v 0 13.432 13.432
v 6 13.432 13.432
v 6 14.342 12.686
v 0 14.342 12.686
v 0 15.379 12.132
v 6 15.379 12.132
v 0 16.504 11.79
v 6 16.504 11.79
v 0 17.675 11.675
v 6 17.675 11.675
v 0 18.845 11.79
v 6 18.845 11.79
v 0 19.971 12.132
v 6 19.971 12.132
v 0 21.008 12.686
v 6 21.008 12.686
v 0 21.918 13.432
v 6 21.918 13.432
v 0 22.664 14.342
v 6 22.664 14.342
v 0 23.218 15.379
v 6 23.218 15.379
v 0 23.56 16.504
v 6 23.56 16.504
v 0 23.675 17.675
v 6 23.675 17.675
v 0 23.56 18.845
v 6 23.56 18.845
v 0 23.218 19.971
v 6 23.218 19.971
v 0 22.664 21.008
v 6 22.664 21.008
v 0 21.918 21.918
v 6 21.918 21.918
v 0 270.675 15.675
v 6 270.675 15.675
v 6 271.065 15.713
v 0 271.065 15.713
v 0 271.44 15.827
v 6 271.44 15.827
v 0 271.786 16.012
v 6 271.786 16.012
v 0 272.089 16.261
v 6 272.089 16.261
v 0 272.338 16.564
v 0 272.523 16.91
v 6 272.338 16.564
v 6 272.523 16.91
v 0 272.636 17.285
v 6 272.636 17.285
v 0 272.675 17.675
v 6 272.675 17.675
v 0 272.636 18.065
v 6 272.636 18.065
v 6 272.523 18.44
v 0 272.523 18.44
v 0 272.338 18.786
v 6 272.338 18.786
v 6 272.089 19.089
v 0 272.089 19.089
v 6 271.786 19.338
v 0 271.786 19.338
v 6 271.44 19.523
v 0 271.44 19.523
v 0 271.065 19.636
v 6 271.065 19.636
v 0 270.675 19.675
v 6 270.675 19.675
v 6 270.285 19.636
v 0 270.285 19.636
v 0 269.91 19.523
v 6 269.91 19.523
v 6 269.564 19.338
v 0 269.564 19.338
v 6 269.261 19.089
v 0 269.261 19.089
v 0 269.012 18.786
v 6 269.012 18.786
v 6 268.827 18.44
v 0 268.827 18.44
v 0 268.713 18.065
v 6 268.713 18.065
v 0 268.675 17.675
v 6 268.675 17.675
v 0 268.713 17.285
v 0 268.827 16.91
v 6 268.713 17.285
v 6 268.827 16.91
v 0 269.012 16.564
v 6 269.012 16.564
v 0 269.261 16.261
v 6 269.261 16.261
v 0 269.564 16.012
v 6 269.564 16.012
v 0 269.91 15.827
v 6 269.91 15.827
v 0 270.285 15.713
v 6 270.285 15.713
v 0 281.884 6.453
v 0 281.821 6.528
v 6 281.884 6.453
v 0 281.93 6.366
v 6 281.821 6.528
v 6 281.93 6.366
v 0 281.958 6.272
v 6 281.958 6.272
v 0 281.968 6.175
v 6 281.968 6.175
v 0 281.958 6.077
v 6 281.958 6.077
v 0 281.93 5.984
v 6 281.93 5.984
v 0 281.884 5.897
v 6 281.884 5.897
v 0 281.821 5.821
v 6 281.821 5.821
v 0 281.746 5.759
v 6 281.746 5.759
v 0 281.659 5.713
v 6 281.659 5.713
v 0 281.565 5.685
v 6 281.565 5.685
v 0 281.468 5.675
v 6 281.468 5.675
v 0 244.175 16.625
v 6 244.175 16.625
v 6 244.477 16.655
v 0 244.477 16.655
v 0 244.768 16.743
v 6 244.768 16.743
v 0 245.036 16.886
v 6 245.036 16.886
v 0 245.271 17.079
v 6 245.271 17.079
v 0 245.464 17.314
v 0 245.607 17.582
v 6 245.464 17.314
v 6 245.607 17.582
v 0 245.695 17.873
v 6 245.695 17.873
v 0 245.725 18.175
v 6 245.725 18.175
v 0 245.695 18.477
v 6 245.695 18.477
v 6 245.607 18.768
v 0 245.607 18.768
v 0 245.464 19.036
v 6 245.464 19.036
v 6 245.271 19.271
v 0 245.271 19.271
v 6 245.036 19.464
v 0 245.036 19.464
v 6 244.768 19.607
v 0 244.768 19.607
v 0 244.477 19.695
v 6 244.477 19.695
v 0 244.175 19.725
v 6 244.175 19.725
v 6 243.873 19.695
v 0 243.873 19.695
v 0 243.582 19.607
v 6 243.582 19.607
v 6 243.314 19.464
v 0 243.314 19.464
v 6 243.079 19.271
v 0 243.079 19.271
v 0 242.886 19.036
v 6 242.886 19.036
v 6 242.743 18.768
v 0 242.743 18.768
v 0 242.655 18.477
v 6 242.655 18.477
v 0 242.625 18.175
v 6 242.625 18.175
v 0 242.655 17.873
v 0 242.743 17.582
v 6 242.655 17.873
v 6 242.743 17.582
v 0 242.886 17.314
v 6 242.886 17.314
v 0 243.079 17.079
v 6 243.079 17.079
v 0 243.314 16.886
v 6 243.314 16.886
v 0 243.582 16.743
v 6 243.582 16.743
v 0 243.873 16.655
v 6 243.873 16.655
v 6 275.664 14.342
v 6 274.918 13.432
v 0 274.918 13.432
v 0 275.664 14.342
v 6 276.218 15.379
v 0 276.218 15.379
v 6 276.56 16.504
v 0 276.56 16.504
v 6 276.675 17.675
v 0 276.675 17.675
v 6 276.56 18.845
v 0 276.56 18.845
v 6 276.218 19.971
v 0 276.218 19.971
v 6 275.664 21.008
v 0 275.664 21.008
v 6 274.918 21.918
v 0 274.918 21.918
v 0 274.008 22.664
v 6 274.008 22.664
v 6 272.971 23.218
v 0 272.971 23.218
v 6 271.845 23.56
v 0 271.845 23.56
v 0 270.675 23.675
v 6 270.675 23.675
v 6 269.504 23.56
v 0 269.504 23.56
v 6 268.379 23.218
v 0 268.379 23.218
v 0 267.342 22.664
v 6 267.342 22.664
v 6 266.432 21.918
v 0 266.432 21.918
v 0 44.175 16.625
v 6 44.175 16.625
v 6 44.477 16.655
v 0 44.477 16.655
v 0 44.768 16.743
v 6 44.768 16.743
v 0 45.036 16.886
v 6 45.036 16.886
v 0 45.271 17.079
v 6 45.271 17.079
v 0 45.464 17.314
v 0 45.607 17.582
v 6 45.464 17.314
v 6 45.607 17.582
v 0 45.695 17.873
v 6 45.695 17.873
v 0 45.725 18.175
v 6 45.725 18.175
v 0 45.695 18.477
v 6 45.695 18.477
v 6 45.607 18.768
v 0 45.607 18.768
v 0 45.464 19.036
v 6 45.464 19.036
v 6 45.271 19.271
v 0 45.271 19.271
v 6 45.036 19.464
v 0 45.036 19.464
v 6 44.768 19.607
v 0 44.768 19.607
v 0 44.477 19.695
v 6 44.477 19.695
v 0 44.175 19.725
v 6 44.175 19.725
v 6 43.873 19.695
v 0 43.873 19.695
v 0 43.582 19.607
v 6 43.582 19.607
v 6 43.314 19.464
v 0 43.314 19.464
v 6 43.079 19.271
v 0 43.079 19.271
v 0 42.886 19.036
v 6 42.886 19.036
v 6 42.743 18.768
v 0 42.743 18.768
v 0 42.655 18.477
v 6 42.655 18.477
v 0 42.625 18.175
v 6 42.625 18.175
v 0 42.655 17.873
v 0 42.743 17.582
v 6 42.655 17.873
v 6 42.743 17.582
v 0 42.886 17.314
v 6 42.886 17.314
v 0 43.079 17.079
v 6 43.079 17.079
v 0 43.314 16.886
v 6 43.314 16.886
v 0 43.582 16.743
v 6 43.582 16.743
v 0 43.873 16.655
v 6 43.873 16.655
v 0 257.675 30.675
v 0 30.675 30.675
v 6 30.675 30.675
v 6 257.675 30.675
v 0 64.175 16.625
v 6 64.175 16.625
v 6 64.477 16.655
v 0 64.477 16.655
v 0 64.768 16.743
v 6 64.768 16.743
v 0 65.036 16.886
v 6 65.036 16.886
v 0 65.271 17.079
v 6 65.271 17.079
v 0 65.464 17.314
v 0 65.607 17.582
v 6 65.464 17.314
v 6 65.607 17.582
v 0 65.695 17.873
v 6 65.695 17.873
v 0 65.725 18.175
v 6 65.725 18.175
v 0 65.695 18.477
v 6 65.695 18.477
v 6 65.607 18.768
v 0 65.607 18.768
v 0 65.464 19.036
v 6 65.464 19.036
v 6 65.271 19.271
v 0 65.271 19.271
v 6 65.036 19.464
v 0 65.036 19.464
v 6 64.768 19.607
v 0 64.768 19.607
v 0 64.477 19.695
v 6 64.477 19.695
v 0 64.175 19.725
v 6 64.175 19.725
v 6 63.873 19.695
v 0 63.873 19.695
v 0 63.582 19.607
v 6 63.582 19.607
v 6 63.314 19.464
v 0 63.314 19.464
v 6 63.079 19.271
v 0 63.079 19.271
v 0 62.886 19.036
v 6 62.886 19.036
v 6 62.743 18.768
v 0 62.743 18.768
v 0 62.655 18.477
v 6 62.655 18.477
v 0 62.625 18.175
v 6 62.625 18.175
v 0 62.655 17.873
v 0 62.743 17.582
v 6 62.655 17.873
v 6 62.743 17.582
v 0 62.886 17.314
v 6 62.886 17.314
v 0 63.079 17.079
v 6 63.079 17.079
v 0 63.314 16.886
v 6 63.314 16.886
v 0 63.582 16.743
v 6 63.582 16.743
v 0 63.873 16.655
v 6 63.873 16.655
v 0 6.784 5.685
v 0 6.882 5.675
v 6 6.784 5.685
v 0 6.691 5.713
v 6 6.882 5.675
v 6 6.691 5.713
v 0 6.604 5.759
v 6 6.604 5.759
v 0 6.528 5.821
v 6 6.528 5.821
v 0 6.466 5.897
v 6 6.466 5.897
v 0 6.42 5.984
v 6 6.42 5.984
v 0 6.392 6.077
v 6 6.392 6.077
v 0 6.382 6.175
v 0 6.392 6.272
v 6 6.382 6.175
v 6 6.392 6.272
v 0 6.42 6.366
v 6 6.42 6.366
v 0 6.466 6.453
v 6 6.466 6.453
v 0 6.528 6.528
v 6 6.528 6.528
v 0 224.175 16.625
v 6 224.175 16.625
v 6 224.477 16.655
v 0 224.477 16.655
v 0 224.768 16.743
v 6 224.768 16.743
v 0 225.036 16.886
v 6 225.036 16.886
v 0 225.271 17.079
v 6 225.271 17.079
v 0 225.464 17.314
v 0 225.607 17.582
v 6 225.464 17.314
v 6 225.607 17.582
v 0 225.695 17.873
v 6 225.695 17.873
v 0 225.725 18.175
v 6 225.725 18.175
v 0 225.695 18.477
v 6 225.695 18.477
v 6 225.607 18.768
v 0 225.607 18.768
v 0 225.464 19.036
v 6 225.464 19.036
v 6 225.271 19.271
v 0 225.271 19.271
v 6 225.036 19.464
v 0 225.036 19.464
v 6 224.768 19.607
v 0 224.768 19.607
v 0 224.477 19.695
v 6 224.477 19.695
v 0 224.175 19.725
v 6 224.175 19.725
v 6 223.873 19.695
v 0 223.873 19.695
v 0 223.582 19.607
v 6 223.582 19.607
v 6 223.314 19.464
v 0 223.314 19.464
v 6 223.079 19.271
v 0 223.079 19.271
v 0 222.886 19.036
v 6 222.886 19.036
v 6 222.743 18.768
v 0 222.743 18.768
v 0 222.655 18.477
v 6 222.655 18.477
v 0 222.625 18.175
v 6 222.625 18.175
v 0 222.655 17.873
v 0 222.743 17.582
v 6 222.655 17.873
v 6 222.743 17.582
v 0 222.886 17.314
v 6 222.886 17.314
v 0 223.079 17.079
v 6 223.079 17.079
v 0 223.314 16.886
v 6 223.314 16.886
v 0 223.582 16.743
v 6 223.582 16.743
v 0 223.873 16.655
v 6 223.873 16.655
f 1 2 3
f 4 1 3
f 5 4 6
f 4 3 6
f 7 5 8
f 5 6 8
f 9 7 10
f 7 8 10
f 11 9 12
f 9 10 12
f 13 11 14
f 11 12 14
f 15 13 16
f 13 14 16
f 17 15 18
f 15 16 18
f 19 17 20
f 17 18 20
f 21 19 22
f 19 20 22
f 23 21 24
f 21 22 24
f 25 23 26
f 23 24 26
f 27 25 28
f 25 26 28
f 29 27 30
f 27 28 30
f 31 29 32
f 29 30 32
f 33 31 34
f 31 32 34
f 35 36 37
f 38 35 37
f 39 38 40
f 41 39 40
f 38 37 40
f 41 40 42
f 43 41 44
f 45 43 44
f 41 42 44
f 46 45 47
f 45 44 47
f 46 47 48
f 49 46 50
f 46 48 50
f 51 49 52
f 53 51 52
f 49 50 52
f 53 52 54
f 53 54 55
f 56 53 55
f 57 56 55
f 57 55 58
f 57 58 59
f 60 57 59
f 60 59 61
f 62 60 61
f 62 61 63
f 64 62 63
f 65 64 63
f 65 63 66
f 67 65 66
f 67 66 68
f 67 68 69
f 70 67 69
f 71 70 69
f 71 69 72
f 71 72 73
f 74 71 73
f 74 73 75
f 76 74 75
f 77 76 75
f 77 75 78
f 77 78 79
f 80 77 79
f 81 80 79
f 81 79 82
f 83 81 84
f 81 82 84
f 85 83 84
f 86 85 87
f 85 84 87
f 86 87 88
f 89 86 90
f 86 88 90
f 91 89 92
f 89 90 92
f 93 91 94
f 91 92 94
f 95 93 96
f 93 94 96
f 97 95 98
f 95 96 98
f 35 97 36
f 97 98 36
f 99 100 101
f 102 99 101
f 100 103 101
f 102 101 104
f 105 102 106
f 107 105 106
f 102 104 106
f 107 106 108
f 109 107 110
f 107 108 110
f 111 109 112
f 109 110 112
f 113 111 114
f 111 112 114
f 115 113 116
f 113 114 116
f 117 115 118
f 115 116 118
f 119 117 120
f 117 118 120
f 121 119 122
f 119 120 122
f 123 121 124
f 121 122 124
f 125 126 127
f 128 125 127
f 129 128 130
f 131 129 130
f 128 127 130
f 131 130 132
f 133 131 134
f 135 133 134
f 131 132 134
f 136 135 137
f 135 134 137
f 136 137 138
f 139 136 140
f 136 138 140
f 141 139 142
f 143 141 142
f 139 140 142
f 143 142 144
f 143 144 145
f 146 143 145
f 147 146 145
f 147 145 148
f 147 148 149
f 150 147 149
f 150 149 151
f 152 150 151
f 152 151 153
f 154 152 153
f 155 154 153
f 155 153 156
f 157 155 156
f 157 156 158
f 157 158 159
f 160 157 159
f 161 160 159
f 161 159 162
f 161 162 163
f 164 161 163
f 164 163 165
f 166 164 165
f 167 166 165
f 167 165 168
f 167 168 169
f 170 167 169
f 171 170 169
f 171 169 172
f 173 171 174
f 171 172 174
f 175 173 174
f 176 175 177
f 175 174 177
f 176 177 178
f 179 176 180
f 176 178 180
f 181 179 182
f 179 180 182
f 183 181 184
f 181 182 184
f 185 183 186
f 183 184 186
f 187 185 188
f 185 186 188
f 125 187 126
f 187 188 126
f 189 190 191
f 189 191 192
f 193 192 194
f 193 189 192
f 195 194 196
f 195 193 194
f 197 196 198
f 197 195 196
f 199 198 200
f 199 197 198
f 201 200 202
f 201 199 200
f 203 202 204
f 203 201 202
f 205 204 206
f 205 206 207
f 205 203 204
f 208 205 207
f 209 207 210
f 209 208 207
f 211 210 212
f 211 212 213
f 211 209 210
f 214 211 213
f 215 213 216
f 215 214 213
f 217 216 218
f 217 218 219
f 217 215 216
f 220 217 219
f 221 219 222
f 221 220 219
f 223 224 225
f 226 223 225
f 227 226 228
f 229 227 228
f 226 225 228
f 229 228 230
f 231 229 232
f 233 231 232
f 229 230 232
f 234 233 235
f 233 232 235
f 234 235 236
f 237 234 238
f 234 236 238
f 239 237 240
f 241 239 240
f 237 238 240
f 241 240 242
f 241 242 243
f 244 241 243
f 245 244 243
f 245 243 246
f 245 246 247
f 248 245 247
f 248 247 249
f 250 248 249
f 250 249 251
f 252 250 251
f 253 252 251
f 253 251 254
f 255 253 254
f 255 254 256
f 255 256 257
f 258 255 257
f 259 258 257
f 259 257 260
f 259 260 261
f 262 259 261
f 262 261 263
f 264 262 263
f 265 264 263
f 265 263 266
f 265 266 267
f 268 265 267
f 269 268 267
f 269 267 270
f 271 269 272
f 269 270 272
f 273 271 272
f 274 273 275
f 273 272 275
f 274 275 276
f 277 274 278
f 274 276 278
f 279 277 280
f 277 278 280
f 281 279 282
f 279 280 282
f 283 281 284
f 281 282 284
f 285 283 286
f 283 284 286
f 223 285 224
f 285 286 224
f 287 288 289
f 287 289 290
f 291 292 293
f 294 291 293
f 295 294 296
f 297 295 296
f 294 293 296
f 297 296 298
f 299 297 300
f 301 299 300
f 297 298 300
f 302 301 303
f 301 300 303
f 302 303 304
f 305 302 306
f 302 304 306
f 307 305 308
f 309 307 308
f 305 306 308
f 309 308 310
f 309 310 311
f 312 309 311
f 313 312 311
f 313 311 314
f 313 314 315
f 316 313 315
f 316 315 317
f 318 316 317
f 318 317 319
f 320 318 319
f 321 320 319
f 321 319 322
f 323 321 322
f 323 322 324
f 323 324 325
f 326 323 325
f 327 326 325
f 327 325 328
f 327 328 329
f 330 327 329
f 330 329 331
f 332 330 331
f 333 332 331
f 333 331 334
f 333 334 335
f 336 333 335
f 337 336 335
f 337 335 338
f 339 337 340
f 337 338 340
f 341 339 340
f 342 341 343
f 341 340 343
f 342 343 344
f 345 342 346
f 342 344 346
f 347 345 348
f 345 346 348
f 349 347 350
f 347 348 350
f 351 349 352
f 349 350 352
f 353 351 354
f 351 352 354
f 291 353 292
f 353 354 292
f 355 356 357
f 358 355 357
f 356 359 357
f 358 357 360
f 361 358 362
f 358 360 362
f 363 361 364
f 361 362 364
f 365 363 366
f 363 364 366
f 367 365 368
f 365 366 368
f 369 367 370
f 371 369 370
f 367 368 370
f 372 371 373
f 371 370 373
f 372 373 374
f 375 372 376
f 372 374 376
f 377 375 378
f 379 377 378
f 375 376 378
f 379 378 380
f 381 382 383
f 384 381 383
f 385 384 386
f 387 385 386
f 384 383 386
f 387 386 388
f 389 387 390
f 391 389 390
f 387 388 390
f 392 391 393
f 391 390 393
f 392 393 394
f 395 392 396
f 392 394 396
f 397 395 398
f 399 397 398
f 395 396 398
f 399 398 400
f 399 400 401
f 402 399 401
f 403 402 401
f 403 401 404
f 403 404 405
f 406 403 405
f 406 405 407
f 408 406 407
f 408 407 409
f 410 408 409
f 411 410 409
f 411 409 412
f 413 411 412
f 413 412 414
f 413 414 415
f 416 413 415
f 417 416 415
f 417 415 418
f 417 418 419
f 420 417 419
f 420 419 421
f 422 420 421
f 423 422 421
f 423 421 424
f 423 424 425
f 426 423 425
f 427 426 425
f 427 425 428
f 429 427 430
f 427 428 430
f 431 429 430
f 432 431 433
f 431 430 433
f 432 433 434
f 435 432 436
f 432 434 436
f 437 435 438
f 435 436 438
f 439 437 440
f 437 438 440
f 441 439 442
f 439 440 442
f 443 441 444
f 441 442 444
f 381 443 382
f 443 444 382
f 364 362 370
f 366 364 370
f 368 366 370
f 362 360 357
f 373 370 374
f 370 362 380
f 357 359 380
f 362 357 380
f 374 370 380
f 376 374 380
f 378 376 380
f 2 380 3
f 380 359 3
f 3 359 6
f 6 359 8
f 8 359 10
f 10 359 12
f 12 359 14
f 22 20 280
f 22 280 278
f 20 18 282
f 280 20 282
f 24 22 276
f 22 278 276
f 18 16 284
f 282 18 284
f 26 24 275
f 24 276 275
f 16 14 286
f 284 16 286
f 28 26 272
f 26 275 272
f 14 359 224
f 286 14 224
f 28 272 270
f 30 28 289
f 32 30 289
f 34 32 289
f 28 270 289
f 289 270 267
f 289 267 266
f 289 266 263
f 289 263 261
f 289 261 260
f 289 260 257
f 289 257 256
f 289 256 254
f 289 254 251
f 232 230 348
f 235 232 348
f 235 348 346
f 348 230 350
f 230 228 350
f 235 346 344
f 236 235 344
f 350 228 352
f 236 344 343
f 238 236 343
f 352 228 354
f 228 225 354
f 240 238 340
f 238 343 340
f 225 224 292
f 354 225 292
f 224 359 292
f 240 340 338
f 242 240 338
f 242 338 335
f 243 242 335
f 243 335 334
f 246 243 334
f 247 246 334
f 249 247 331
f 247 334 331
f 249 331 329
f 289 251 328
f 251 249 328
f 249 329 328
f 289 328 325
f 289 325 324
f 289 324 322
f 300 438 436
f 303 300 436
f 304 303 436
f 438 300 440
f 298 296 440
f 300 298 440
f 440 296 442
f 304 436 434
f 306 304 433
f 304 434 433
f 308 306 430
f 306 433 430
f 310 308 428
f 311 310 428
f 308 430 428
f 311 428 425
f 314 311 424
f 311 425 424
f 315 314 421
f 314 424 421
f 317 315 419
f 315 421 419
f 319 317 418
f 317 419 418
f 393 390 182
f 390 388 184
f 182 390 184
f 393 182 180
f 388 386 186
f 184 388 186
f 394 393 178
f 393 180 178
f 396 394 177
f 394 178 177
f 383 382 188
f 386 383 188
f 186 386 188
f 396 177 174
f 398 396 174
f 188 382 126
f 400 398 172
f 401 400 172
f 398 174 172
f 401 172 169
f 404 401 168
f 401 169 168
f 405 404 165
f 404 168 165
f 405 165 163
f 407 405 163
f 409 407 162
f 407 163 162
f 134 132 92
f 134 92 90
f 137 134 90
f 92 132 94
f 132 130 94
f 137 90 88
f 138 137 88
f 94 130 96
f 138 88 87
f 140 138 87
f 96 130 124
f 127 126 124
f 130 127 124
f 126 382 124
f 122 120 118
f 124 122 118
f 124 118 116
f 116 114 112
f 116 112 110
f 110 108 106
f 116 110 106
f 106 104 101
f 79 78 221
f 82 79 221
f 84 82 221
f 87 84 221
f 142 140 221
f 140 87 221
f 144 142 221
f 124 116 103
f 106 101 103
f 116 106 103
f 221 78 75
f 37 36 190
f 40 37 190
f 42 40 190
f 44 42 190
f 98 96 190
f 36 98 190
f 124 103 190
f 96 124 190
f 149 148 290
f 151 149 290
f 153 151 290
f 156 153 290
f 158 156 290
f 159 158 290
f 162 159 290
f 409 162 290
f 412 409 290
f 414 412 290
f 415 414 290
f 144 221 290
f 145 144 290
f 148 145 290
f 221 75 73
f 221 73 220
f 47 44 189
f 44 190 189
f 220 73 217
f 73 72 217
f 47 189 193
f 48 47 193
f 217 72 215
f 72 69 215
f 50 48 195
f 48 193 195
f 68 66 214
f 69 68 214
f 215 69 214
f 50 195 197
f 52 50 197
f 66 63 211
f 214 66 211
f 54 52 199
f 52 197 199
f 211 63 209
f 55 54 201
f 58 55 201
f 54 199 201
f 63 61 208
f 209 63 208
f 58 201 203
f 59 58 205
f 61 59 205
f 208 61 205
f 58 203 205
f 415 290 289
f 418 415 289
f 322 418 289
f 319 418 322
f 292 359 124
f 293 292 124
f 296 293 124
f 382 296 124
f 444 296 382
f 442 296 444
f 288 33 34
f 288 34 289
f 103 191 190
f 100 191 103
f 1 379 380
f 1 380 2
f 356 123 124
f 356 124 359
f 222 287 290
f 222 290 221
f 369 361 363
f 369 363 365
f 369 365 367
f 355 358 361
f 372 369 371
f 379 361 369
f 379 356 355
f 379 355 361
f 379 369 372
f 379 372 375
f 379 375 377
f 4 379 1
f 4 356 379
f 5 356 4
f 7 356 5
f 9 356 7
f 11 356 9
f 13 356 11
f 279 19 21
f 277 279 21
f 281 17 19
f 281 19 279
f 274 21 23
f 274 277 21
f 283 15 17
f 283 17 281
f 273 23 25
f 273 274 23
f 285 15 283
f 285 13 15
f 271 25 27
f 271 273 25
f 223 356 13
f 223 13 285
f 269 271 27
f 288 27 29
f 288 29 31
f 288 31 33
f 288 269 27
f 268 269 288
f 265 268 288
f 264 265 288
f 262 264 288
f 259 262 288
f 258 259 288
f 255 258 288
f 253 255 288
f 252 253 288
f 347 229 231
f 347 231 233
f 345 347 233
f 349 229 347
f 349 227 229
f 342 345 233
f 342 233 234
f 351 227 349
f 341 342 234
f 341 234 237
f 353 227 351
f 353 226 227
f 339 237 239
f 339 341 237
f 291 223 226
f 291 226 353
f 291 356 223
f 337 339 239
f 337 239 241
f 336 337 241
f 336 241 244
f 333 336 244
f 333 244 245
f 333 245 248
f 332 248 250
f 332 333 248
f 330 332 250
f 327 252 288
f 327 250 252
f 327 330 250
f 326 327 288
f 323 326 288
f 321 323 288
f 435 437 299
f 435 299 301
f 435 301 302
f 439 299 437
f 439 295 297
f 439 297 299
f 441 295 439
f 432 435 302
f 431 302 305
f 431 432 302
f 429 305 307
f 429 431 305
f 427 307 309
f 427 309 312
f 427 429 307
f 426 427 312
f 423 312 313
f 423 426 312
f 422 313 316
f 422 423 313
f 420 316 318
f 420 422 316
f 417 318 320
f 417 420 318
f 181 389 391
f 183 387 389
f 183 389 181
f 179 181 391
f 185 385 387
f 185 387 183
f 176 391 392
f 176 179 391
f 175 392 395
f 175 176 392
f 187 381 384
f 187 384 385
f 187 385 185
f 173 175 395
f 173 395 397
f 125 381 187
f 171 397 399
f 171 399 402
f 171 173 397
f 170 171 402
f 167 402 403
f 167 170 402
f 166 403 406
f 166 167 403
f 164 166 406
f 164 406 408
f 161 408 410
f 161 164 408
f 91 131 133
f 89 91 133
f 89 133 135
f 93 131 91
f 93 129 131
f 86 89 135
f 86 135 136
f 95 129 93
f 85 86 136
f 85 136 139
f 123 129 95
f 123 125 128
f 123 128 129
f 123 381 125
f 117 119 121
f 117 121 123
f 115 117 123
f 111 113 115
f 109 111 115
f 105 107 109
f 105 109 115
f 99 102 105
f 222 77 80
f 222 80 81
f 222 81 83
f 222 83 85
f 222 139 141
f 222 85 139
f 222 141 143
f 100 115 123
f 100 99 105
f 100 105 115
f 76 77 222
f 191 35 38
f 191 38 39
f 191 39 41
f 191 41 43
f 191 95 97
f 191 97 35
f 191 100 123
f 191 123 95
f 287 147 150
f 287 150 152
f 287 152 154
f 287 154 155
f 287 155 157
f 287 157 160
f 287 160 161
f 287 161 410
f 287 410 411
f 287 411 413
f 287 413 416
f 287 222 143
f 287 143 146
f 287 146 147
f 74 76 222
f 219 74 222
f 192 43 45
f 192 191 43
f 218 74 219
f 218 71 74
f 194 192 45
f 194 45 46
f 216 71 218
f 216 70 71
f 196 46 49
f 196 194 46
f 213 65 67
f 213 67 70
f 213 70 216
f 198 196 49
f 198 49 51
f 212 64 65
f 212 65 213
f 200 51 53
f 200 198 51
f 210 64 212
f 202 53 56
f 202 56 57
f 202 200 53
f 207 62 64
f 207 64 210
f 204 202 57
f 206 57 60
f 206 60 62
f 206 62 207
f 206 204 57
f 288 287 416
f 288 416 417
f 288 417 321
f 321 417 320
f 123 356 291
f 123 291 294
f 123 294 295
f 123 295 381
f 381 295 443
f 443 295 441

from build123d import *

# Parameters (mm, degrees)
BOSS_EXTRUDE1_DEPTH = 6
FILLET1_R           = 0.5
SKETCH4_R           = 6
BOSS_EXTRUDE2_DEPTH = 6
SKETCH3_R           = 2
SKETCH3_R_2         = 6
CUT_EXTRUDE1_DEPTH  = 284.694910827
CUT_EXTRUDE2_REACH  = 285.695
SKETCH6_R           = 1.55


with BuildPart() as part:
    # Sketch2 → Boss-Extrude1 (new body)
    with BuildSketch(Plane(origin=(0, 0, 0), x_dir=(0, 0, -1), z_dir=(1, 0, 0))):
        Polygon((-30.67492643, 30.67492643), (-30.67492643, 257.67492643), (-5.67492643, 282.67492643), (-5.67492643, 5.67492643), align=None)
    extrude(amount=BOSS_EXTRUDE1_DEPTH)

    # Fillet1
    fillet1_edges = [part.edges().sort_by_distance(p)[0] for p in [
        (3, 282.67492643, 5.67492643),
        (3, 5.67492643, 5.67492643),
    ]]
    fillet(fillet1_edges, radius=FILLET1_R)

    # Sketch4 → Boss-Extrude2 (add)
    with BuildSketch(Plane(origin=(6, 0, 0), x_dir=(0, 0, -1), z_dir=(1, 0, 0))):
        with Locations((-17.67492643, 270.67492643)):
            Circle(SKETCH4_R)
    extrude(amount=-BOSS_EXTRUDE2_DEPTH)

    # Sketch3 → Cut-Extrude1 (cut, through all)
    with BuildSketch(Plane(origin=(6, 0, 0), x_dir=(0, 0, -1), z_dir=(1, 0, 0))):
        with Locations((-17.67492643, 270.67492643)):
            Circle(SKETCH3_R)
        with Locations((-17.67492643, 17.67492643)):
            Circle(SKETCH3_R_2)
    extrude(amount=-CUT_EXTRUDE1_DEPTH, mode=Mode.SUBTRACT)

    # Sketch6 → Cut-Extrude2 (cut, up to next)
    with BuildSketch(Plane(origin=(6, 0, 0), x_dir=(0, 0, -1), z_dir=(1, 0, 0)), mode=Mode.PRIVATE) as cut_extrude2_sk1:
        with Locations((-18.17492643, 244.17492643)):
            Circle(SKETCH6_R)
    cut_extrude2_tool1 = extrude(cut_extrude2_sk1.sketch, amount=-CUT_EXTRUDE2_REACH, mode=Mode.PRIVATE) & part.part
    # Sketch6 → Cut-Extrude2 (cut, up to next)
    with BuildSketch(Plane(origin=(6, 0, 0), x_dir=(0, 0, -1), z_dir=(1, 0, 0)), mode=Mode.PRIVATE) as cut_extrude2_sk2:
        with Locations((-18.17492643, 224.17492643)):
            Circle(SKETCH6_R)
    cut_extrude2_tool2 = extrude(cut_extrude2_sk2.sketch, amount=-CUT_EXTRUDE2_REACH, mode=Mode.PRIVATE) & part.part
    # Sketch6 → Cut-Extrude2 (cut, up to next)
    with BuildSketch(Plane(origin=(6, 0, 0), x_dir=(0, 0, -1), z_dir=(1, 0, 0)), mode=Mode.PRIVATE) as cut_extrude2_sk3:
        with Locations((-18.17492643, 64.17492643)):
            Circle(SKETCH6_R)
    cut_extrude2_tool3 = extrude(cut_extrude2_sk3.sketch, amount=-CUT_EXTRUDE2_REACH, mode=Mode.PRIVATE) & part.part
    # Sketch6 → Cut-Extrude2 (cut, up to next)
    with BuildSketch(Plane(origin=(6, 0, 0), x_dir=(0, 0, -1), z_dir=(1, 0, 0)), mode=Mode.PRIVATE) as cut_extrude2_sk4:
        with Locations((-18.17492643, 44.17492643)):
            Circle(SKETCH6_R)
    cut_extrude2_tool4 = extrude(cut_extrude2_sk4.sketch, amount=-CUT_EXTRUDE2_REACH, mode=Mode.PRIVATE) & part.part
    add(cut_extrude2_tool1.solids().sort_by_distance((6, 244.174926, 18.174926))[0], mode=Mode.SUBTRACT)
    add(cut_extrude2_tool2.solids().sort_by_distance((6, 224.174926, 18.174926))[0], mode=Mode.SUBTRACT)
    add(cut_extrude2_tool3.solids().sort_by_distance((6, 64.174926, 18.174926))[0], mode=Mode.SUBTRACT)
    add(cut_extrude2_tool4.solids().sort_by_distance((6, 44.174926, 18.174926))[0], mode=Mode.SUBTRACT)


solid = part.part
